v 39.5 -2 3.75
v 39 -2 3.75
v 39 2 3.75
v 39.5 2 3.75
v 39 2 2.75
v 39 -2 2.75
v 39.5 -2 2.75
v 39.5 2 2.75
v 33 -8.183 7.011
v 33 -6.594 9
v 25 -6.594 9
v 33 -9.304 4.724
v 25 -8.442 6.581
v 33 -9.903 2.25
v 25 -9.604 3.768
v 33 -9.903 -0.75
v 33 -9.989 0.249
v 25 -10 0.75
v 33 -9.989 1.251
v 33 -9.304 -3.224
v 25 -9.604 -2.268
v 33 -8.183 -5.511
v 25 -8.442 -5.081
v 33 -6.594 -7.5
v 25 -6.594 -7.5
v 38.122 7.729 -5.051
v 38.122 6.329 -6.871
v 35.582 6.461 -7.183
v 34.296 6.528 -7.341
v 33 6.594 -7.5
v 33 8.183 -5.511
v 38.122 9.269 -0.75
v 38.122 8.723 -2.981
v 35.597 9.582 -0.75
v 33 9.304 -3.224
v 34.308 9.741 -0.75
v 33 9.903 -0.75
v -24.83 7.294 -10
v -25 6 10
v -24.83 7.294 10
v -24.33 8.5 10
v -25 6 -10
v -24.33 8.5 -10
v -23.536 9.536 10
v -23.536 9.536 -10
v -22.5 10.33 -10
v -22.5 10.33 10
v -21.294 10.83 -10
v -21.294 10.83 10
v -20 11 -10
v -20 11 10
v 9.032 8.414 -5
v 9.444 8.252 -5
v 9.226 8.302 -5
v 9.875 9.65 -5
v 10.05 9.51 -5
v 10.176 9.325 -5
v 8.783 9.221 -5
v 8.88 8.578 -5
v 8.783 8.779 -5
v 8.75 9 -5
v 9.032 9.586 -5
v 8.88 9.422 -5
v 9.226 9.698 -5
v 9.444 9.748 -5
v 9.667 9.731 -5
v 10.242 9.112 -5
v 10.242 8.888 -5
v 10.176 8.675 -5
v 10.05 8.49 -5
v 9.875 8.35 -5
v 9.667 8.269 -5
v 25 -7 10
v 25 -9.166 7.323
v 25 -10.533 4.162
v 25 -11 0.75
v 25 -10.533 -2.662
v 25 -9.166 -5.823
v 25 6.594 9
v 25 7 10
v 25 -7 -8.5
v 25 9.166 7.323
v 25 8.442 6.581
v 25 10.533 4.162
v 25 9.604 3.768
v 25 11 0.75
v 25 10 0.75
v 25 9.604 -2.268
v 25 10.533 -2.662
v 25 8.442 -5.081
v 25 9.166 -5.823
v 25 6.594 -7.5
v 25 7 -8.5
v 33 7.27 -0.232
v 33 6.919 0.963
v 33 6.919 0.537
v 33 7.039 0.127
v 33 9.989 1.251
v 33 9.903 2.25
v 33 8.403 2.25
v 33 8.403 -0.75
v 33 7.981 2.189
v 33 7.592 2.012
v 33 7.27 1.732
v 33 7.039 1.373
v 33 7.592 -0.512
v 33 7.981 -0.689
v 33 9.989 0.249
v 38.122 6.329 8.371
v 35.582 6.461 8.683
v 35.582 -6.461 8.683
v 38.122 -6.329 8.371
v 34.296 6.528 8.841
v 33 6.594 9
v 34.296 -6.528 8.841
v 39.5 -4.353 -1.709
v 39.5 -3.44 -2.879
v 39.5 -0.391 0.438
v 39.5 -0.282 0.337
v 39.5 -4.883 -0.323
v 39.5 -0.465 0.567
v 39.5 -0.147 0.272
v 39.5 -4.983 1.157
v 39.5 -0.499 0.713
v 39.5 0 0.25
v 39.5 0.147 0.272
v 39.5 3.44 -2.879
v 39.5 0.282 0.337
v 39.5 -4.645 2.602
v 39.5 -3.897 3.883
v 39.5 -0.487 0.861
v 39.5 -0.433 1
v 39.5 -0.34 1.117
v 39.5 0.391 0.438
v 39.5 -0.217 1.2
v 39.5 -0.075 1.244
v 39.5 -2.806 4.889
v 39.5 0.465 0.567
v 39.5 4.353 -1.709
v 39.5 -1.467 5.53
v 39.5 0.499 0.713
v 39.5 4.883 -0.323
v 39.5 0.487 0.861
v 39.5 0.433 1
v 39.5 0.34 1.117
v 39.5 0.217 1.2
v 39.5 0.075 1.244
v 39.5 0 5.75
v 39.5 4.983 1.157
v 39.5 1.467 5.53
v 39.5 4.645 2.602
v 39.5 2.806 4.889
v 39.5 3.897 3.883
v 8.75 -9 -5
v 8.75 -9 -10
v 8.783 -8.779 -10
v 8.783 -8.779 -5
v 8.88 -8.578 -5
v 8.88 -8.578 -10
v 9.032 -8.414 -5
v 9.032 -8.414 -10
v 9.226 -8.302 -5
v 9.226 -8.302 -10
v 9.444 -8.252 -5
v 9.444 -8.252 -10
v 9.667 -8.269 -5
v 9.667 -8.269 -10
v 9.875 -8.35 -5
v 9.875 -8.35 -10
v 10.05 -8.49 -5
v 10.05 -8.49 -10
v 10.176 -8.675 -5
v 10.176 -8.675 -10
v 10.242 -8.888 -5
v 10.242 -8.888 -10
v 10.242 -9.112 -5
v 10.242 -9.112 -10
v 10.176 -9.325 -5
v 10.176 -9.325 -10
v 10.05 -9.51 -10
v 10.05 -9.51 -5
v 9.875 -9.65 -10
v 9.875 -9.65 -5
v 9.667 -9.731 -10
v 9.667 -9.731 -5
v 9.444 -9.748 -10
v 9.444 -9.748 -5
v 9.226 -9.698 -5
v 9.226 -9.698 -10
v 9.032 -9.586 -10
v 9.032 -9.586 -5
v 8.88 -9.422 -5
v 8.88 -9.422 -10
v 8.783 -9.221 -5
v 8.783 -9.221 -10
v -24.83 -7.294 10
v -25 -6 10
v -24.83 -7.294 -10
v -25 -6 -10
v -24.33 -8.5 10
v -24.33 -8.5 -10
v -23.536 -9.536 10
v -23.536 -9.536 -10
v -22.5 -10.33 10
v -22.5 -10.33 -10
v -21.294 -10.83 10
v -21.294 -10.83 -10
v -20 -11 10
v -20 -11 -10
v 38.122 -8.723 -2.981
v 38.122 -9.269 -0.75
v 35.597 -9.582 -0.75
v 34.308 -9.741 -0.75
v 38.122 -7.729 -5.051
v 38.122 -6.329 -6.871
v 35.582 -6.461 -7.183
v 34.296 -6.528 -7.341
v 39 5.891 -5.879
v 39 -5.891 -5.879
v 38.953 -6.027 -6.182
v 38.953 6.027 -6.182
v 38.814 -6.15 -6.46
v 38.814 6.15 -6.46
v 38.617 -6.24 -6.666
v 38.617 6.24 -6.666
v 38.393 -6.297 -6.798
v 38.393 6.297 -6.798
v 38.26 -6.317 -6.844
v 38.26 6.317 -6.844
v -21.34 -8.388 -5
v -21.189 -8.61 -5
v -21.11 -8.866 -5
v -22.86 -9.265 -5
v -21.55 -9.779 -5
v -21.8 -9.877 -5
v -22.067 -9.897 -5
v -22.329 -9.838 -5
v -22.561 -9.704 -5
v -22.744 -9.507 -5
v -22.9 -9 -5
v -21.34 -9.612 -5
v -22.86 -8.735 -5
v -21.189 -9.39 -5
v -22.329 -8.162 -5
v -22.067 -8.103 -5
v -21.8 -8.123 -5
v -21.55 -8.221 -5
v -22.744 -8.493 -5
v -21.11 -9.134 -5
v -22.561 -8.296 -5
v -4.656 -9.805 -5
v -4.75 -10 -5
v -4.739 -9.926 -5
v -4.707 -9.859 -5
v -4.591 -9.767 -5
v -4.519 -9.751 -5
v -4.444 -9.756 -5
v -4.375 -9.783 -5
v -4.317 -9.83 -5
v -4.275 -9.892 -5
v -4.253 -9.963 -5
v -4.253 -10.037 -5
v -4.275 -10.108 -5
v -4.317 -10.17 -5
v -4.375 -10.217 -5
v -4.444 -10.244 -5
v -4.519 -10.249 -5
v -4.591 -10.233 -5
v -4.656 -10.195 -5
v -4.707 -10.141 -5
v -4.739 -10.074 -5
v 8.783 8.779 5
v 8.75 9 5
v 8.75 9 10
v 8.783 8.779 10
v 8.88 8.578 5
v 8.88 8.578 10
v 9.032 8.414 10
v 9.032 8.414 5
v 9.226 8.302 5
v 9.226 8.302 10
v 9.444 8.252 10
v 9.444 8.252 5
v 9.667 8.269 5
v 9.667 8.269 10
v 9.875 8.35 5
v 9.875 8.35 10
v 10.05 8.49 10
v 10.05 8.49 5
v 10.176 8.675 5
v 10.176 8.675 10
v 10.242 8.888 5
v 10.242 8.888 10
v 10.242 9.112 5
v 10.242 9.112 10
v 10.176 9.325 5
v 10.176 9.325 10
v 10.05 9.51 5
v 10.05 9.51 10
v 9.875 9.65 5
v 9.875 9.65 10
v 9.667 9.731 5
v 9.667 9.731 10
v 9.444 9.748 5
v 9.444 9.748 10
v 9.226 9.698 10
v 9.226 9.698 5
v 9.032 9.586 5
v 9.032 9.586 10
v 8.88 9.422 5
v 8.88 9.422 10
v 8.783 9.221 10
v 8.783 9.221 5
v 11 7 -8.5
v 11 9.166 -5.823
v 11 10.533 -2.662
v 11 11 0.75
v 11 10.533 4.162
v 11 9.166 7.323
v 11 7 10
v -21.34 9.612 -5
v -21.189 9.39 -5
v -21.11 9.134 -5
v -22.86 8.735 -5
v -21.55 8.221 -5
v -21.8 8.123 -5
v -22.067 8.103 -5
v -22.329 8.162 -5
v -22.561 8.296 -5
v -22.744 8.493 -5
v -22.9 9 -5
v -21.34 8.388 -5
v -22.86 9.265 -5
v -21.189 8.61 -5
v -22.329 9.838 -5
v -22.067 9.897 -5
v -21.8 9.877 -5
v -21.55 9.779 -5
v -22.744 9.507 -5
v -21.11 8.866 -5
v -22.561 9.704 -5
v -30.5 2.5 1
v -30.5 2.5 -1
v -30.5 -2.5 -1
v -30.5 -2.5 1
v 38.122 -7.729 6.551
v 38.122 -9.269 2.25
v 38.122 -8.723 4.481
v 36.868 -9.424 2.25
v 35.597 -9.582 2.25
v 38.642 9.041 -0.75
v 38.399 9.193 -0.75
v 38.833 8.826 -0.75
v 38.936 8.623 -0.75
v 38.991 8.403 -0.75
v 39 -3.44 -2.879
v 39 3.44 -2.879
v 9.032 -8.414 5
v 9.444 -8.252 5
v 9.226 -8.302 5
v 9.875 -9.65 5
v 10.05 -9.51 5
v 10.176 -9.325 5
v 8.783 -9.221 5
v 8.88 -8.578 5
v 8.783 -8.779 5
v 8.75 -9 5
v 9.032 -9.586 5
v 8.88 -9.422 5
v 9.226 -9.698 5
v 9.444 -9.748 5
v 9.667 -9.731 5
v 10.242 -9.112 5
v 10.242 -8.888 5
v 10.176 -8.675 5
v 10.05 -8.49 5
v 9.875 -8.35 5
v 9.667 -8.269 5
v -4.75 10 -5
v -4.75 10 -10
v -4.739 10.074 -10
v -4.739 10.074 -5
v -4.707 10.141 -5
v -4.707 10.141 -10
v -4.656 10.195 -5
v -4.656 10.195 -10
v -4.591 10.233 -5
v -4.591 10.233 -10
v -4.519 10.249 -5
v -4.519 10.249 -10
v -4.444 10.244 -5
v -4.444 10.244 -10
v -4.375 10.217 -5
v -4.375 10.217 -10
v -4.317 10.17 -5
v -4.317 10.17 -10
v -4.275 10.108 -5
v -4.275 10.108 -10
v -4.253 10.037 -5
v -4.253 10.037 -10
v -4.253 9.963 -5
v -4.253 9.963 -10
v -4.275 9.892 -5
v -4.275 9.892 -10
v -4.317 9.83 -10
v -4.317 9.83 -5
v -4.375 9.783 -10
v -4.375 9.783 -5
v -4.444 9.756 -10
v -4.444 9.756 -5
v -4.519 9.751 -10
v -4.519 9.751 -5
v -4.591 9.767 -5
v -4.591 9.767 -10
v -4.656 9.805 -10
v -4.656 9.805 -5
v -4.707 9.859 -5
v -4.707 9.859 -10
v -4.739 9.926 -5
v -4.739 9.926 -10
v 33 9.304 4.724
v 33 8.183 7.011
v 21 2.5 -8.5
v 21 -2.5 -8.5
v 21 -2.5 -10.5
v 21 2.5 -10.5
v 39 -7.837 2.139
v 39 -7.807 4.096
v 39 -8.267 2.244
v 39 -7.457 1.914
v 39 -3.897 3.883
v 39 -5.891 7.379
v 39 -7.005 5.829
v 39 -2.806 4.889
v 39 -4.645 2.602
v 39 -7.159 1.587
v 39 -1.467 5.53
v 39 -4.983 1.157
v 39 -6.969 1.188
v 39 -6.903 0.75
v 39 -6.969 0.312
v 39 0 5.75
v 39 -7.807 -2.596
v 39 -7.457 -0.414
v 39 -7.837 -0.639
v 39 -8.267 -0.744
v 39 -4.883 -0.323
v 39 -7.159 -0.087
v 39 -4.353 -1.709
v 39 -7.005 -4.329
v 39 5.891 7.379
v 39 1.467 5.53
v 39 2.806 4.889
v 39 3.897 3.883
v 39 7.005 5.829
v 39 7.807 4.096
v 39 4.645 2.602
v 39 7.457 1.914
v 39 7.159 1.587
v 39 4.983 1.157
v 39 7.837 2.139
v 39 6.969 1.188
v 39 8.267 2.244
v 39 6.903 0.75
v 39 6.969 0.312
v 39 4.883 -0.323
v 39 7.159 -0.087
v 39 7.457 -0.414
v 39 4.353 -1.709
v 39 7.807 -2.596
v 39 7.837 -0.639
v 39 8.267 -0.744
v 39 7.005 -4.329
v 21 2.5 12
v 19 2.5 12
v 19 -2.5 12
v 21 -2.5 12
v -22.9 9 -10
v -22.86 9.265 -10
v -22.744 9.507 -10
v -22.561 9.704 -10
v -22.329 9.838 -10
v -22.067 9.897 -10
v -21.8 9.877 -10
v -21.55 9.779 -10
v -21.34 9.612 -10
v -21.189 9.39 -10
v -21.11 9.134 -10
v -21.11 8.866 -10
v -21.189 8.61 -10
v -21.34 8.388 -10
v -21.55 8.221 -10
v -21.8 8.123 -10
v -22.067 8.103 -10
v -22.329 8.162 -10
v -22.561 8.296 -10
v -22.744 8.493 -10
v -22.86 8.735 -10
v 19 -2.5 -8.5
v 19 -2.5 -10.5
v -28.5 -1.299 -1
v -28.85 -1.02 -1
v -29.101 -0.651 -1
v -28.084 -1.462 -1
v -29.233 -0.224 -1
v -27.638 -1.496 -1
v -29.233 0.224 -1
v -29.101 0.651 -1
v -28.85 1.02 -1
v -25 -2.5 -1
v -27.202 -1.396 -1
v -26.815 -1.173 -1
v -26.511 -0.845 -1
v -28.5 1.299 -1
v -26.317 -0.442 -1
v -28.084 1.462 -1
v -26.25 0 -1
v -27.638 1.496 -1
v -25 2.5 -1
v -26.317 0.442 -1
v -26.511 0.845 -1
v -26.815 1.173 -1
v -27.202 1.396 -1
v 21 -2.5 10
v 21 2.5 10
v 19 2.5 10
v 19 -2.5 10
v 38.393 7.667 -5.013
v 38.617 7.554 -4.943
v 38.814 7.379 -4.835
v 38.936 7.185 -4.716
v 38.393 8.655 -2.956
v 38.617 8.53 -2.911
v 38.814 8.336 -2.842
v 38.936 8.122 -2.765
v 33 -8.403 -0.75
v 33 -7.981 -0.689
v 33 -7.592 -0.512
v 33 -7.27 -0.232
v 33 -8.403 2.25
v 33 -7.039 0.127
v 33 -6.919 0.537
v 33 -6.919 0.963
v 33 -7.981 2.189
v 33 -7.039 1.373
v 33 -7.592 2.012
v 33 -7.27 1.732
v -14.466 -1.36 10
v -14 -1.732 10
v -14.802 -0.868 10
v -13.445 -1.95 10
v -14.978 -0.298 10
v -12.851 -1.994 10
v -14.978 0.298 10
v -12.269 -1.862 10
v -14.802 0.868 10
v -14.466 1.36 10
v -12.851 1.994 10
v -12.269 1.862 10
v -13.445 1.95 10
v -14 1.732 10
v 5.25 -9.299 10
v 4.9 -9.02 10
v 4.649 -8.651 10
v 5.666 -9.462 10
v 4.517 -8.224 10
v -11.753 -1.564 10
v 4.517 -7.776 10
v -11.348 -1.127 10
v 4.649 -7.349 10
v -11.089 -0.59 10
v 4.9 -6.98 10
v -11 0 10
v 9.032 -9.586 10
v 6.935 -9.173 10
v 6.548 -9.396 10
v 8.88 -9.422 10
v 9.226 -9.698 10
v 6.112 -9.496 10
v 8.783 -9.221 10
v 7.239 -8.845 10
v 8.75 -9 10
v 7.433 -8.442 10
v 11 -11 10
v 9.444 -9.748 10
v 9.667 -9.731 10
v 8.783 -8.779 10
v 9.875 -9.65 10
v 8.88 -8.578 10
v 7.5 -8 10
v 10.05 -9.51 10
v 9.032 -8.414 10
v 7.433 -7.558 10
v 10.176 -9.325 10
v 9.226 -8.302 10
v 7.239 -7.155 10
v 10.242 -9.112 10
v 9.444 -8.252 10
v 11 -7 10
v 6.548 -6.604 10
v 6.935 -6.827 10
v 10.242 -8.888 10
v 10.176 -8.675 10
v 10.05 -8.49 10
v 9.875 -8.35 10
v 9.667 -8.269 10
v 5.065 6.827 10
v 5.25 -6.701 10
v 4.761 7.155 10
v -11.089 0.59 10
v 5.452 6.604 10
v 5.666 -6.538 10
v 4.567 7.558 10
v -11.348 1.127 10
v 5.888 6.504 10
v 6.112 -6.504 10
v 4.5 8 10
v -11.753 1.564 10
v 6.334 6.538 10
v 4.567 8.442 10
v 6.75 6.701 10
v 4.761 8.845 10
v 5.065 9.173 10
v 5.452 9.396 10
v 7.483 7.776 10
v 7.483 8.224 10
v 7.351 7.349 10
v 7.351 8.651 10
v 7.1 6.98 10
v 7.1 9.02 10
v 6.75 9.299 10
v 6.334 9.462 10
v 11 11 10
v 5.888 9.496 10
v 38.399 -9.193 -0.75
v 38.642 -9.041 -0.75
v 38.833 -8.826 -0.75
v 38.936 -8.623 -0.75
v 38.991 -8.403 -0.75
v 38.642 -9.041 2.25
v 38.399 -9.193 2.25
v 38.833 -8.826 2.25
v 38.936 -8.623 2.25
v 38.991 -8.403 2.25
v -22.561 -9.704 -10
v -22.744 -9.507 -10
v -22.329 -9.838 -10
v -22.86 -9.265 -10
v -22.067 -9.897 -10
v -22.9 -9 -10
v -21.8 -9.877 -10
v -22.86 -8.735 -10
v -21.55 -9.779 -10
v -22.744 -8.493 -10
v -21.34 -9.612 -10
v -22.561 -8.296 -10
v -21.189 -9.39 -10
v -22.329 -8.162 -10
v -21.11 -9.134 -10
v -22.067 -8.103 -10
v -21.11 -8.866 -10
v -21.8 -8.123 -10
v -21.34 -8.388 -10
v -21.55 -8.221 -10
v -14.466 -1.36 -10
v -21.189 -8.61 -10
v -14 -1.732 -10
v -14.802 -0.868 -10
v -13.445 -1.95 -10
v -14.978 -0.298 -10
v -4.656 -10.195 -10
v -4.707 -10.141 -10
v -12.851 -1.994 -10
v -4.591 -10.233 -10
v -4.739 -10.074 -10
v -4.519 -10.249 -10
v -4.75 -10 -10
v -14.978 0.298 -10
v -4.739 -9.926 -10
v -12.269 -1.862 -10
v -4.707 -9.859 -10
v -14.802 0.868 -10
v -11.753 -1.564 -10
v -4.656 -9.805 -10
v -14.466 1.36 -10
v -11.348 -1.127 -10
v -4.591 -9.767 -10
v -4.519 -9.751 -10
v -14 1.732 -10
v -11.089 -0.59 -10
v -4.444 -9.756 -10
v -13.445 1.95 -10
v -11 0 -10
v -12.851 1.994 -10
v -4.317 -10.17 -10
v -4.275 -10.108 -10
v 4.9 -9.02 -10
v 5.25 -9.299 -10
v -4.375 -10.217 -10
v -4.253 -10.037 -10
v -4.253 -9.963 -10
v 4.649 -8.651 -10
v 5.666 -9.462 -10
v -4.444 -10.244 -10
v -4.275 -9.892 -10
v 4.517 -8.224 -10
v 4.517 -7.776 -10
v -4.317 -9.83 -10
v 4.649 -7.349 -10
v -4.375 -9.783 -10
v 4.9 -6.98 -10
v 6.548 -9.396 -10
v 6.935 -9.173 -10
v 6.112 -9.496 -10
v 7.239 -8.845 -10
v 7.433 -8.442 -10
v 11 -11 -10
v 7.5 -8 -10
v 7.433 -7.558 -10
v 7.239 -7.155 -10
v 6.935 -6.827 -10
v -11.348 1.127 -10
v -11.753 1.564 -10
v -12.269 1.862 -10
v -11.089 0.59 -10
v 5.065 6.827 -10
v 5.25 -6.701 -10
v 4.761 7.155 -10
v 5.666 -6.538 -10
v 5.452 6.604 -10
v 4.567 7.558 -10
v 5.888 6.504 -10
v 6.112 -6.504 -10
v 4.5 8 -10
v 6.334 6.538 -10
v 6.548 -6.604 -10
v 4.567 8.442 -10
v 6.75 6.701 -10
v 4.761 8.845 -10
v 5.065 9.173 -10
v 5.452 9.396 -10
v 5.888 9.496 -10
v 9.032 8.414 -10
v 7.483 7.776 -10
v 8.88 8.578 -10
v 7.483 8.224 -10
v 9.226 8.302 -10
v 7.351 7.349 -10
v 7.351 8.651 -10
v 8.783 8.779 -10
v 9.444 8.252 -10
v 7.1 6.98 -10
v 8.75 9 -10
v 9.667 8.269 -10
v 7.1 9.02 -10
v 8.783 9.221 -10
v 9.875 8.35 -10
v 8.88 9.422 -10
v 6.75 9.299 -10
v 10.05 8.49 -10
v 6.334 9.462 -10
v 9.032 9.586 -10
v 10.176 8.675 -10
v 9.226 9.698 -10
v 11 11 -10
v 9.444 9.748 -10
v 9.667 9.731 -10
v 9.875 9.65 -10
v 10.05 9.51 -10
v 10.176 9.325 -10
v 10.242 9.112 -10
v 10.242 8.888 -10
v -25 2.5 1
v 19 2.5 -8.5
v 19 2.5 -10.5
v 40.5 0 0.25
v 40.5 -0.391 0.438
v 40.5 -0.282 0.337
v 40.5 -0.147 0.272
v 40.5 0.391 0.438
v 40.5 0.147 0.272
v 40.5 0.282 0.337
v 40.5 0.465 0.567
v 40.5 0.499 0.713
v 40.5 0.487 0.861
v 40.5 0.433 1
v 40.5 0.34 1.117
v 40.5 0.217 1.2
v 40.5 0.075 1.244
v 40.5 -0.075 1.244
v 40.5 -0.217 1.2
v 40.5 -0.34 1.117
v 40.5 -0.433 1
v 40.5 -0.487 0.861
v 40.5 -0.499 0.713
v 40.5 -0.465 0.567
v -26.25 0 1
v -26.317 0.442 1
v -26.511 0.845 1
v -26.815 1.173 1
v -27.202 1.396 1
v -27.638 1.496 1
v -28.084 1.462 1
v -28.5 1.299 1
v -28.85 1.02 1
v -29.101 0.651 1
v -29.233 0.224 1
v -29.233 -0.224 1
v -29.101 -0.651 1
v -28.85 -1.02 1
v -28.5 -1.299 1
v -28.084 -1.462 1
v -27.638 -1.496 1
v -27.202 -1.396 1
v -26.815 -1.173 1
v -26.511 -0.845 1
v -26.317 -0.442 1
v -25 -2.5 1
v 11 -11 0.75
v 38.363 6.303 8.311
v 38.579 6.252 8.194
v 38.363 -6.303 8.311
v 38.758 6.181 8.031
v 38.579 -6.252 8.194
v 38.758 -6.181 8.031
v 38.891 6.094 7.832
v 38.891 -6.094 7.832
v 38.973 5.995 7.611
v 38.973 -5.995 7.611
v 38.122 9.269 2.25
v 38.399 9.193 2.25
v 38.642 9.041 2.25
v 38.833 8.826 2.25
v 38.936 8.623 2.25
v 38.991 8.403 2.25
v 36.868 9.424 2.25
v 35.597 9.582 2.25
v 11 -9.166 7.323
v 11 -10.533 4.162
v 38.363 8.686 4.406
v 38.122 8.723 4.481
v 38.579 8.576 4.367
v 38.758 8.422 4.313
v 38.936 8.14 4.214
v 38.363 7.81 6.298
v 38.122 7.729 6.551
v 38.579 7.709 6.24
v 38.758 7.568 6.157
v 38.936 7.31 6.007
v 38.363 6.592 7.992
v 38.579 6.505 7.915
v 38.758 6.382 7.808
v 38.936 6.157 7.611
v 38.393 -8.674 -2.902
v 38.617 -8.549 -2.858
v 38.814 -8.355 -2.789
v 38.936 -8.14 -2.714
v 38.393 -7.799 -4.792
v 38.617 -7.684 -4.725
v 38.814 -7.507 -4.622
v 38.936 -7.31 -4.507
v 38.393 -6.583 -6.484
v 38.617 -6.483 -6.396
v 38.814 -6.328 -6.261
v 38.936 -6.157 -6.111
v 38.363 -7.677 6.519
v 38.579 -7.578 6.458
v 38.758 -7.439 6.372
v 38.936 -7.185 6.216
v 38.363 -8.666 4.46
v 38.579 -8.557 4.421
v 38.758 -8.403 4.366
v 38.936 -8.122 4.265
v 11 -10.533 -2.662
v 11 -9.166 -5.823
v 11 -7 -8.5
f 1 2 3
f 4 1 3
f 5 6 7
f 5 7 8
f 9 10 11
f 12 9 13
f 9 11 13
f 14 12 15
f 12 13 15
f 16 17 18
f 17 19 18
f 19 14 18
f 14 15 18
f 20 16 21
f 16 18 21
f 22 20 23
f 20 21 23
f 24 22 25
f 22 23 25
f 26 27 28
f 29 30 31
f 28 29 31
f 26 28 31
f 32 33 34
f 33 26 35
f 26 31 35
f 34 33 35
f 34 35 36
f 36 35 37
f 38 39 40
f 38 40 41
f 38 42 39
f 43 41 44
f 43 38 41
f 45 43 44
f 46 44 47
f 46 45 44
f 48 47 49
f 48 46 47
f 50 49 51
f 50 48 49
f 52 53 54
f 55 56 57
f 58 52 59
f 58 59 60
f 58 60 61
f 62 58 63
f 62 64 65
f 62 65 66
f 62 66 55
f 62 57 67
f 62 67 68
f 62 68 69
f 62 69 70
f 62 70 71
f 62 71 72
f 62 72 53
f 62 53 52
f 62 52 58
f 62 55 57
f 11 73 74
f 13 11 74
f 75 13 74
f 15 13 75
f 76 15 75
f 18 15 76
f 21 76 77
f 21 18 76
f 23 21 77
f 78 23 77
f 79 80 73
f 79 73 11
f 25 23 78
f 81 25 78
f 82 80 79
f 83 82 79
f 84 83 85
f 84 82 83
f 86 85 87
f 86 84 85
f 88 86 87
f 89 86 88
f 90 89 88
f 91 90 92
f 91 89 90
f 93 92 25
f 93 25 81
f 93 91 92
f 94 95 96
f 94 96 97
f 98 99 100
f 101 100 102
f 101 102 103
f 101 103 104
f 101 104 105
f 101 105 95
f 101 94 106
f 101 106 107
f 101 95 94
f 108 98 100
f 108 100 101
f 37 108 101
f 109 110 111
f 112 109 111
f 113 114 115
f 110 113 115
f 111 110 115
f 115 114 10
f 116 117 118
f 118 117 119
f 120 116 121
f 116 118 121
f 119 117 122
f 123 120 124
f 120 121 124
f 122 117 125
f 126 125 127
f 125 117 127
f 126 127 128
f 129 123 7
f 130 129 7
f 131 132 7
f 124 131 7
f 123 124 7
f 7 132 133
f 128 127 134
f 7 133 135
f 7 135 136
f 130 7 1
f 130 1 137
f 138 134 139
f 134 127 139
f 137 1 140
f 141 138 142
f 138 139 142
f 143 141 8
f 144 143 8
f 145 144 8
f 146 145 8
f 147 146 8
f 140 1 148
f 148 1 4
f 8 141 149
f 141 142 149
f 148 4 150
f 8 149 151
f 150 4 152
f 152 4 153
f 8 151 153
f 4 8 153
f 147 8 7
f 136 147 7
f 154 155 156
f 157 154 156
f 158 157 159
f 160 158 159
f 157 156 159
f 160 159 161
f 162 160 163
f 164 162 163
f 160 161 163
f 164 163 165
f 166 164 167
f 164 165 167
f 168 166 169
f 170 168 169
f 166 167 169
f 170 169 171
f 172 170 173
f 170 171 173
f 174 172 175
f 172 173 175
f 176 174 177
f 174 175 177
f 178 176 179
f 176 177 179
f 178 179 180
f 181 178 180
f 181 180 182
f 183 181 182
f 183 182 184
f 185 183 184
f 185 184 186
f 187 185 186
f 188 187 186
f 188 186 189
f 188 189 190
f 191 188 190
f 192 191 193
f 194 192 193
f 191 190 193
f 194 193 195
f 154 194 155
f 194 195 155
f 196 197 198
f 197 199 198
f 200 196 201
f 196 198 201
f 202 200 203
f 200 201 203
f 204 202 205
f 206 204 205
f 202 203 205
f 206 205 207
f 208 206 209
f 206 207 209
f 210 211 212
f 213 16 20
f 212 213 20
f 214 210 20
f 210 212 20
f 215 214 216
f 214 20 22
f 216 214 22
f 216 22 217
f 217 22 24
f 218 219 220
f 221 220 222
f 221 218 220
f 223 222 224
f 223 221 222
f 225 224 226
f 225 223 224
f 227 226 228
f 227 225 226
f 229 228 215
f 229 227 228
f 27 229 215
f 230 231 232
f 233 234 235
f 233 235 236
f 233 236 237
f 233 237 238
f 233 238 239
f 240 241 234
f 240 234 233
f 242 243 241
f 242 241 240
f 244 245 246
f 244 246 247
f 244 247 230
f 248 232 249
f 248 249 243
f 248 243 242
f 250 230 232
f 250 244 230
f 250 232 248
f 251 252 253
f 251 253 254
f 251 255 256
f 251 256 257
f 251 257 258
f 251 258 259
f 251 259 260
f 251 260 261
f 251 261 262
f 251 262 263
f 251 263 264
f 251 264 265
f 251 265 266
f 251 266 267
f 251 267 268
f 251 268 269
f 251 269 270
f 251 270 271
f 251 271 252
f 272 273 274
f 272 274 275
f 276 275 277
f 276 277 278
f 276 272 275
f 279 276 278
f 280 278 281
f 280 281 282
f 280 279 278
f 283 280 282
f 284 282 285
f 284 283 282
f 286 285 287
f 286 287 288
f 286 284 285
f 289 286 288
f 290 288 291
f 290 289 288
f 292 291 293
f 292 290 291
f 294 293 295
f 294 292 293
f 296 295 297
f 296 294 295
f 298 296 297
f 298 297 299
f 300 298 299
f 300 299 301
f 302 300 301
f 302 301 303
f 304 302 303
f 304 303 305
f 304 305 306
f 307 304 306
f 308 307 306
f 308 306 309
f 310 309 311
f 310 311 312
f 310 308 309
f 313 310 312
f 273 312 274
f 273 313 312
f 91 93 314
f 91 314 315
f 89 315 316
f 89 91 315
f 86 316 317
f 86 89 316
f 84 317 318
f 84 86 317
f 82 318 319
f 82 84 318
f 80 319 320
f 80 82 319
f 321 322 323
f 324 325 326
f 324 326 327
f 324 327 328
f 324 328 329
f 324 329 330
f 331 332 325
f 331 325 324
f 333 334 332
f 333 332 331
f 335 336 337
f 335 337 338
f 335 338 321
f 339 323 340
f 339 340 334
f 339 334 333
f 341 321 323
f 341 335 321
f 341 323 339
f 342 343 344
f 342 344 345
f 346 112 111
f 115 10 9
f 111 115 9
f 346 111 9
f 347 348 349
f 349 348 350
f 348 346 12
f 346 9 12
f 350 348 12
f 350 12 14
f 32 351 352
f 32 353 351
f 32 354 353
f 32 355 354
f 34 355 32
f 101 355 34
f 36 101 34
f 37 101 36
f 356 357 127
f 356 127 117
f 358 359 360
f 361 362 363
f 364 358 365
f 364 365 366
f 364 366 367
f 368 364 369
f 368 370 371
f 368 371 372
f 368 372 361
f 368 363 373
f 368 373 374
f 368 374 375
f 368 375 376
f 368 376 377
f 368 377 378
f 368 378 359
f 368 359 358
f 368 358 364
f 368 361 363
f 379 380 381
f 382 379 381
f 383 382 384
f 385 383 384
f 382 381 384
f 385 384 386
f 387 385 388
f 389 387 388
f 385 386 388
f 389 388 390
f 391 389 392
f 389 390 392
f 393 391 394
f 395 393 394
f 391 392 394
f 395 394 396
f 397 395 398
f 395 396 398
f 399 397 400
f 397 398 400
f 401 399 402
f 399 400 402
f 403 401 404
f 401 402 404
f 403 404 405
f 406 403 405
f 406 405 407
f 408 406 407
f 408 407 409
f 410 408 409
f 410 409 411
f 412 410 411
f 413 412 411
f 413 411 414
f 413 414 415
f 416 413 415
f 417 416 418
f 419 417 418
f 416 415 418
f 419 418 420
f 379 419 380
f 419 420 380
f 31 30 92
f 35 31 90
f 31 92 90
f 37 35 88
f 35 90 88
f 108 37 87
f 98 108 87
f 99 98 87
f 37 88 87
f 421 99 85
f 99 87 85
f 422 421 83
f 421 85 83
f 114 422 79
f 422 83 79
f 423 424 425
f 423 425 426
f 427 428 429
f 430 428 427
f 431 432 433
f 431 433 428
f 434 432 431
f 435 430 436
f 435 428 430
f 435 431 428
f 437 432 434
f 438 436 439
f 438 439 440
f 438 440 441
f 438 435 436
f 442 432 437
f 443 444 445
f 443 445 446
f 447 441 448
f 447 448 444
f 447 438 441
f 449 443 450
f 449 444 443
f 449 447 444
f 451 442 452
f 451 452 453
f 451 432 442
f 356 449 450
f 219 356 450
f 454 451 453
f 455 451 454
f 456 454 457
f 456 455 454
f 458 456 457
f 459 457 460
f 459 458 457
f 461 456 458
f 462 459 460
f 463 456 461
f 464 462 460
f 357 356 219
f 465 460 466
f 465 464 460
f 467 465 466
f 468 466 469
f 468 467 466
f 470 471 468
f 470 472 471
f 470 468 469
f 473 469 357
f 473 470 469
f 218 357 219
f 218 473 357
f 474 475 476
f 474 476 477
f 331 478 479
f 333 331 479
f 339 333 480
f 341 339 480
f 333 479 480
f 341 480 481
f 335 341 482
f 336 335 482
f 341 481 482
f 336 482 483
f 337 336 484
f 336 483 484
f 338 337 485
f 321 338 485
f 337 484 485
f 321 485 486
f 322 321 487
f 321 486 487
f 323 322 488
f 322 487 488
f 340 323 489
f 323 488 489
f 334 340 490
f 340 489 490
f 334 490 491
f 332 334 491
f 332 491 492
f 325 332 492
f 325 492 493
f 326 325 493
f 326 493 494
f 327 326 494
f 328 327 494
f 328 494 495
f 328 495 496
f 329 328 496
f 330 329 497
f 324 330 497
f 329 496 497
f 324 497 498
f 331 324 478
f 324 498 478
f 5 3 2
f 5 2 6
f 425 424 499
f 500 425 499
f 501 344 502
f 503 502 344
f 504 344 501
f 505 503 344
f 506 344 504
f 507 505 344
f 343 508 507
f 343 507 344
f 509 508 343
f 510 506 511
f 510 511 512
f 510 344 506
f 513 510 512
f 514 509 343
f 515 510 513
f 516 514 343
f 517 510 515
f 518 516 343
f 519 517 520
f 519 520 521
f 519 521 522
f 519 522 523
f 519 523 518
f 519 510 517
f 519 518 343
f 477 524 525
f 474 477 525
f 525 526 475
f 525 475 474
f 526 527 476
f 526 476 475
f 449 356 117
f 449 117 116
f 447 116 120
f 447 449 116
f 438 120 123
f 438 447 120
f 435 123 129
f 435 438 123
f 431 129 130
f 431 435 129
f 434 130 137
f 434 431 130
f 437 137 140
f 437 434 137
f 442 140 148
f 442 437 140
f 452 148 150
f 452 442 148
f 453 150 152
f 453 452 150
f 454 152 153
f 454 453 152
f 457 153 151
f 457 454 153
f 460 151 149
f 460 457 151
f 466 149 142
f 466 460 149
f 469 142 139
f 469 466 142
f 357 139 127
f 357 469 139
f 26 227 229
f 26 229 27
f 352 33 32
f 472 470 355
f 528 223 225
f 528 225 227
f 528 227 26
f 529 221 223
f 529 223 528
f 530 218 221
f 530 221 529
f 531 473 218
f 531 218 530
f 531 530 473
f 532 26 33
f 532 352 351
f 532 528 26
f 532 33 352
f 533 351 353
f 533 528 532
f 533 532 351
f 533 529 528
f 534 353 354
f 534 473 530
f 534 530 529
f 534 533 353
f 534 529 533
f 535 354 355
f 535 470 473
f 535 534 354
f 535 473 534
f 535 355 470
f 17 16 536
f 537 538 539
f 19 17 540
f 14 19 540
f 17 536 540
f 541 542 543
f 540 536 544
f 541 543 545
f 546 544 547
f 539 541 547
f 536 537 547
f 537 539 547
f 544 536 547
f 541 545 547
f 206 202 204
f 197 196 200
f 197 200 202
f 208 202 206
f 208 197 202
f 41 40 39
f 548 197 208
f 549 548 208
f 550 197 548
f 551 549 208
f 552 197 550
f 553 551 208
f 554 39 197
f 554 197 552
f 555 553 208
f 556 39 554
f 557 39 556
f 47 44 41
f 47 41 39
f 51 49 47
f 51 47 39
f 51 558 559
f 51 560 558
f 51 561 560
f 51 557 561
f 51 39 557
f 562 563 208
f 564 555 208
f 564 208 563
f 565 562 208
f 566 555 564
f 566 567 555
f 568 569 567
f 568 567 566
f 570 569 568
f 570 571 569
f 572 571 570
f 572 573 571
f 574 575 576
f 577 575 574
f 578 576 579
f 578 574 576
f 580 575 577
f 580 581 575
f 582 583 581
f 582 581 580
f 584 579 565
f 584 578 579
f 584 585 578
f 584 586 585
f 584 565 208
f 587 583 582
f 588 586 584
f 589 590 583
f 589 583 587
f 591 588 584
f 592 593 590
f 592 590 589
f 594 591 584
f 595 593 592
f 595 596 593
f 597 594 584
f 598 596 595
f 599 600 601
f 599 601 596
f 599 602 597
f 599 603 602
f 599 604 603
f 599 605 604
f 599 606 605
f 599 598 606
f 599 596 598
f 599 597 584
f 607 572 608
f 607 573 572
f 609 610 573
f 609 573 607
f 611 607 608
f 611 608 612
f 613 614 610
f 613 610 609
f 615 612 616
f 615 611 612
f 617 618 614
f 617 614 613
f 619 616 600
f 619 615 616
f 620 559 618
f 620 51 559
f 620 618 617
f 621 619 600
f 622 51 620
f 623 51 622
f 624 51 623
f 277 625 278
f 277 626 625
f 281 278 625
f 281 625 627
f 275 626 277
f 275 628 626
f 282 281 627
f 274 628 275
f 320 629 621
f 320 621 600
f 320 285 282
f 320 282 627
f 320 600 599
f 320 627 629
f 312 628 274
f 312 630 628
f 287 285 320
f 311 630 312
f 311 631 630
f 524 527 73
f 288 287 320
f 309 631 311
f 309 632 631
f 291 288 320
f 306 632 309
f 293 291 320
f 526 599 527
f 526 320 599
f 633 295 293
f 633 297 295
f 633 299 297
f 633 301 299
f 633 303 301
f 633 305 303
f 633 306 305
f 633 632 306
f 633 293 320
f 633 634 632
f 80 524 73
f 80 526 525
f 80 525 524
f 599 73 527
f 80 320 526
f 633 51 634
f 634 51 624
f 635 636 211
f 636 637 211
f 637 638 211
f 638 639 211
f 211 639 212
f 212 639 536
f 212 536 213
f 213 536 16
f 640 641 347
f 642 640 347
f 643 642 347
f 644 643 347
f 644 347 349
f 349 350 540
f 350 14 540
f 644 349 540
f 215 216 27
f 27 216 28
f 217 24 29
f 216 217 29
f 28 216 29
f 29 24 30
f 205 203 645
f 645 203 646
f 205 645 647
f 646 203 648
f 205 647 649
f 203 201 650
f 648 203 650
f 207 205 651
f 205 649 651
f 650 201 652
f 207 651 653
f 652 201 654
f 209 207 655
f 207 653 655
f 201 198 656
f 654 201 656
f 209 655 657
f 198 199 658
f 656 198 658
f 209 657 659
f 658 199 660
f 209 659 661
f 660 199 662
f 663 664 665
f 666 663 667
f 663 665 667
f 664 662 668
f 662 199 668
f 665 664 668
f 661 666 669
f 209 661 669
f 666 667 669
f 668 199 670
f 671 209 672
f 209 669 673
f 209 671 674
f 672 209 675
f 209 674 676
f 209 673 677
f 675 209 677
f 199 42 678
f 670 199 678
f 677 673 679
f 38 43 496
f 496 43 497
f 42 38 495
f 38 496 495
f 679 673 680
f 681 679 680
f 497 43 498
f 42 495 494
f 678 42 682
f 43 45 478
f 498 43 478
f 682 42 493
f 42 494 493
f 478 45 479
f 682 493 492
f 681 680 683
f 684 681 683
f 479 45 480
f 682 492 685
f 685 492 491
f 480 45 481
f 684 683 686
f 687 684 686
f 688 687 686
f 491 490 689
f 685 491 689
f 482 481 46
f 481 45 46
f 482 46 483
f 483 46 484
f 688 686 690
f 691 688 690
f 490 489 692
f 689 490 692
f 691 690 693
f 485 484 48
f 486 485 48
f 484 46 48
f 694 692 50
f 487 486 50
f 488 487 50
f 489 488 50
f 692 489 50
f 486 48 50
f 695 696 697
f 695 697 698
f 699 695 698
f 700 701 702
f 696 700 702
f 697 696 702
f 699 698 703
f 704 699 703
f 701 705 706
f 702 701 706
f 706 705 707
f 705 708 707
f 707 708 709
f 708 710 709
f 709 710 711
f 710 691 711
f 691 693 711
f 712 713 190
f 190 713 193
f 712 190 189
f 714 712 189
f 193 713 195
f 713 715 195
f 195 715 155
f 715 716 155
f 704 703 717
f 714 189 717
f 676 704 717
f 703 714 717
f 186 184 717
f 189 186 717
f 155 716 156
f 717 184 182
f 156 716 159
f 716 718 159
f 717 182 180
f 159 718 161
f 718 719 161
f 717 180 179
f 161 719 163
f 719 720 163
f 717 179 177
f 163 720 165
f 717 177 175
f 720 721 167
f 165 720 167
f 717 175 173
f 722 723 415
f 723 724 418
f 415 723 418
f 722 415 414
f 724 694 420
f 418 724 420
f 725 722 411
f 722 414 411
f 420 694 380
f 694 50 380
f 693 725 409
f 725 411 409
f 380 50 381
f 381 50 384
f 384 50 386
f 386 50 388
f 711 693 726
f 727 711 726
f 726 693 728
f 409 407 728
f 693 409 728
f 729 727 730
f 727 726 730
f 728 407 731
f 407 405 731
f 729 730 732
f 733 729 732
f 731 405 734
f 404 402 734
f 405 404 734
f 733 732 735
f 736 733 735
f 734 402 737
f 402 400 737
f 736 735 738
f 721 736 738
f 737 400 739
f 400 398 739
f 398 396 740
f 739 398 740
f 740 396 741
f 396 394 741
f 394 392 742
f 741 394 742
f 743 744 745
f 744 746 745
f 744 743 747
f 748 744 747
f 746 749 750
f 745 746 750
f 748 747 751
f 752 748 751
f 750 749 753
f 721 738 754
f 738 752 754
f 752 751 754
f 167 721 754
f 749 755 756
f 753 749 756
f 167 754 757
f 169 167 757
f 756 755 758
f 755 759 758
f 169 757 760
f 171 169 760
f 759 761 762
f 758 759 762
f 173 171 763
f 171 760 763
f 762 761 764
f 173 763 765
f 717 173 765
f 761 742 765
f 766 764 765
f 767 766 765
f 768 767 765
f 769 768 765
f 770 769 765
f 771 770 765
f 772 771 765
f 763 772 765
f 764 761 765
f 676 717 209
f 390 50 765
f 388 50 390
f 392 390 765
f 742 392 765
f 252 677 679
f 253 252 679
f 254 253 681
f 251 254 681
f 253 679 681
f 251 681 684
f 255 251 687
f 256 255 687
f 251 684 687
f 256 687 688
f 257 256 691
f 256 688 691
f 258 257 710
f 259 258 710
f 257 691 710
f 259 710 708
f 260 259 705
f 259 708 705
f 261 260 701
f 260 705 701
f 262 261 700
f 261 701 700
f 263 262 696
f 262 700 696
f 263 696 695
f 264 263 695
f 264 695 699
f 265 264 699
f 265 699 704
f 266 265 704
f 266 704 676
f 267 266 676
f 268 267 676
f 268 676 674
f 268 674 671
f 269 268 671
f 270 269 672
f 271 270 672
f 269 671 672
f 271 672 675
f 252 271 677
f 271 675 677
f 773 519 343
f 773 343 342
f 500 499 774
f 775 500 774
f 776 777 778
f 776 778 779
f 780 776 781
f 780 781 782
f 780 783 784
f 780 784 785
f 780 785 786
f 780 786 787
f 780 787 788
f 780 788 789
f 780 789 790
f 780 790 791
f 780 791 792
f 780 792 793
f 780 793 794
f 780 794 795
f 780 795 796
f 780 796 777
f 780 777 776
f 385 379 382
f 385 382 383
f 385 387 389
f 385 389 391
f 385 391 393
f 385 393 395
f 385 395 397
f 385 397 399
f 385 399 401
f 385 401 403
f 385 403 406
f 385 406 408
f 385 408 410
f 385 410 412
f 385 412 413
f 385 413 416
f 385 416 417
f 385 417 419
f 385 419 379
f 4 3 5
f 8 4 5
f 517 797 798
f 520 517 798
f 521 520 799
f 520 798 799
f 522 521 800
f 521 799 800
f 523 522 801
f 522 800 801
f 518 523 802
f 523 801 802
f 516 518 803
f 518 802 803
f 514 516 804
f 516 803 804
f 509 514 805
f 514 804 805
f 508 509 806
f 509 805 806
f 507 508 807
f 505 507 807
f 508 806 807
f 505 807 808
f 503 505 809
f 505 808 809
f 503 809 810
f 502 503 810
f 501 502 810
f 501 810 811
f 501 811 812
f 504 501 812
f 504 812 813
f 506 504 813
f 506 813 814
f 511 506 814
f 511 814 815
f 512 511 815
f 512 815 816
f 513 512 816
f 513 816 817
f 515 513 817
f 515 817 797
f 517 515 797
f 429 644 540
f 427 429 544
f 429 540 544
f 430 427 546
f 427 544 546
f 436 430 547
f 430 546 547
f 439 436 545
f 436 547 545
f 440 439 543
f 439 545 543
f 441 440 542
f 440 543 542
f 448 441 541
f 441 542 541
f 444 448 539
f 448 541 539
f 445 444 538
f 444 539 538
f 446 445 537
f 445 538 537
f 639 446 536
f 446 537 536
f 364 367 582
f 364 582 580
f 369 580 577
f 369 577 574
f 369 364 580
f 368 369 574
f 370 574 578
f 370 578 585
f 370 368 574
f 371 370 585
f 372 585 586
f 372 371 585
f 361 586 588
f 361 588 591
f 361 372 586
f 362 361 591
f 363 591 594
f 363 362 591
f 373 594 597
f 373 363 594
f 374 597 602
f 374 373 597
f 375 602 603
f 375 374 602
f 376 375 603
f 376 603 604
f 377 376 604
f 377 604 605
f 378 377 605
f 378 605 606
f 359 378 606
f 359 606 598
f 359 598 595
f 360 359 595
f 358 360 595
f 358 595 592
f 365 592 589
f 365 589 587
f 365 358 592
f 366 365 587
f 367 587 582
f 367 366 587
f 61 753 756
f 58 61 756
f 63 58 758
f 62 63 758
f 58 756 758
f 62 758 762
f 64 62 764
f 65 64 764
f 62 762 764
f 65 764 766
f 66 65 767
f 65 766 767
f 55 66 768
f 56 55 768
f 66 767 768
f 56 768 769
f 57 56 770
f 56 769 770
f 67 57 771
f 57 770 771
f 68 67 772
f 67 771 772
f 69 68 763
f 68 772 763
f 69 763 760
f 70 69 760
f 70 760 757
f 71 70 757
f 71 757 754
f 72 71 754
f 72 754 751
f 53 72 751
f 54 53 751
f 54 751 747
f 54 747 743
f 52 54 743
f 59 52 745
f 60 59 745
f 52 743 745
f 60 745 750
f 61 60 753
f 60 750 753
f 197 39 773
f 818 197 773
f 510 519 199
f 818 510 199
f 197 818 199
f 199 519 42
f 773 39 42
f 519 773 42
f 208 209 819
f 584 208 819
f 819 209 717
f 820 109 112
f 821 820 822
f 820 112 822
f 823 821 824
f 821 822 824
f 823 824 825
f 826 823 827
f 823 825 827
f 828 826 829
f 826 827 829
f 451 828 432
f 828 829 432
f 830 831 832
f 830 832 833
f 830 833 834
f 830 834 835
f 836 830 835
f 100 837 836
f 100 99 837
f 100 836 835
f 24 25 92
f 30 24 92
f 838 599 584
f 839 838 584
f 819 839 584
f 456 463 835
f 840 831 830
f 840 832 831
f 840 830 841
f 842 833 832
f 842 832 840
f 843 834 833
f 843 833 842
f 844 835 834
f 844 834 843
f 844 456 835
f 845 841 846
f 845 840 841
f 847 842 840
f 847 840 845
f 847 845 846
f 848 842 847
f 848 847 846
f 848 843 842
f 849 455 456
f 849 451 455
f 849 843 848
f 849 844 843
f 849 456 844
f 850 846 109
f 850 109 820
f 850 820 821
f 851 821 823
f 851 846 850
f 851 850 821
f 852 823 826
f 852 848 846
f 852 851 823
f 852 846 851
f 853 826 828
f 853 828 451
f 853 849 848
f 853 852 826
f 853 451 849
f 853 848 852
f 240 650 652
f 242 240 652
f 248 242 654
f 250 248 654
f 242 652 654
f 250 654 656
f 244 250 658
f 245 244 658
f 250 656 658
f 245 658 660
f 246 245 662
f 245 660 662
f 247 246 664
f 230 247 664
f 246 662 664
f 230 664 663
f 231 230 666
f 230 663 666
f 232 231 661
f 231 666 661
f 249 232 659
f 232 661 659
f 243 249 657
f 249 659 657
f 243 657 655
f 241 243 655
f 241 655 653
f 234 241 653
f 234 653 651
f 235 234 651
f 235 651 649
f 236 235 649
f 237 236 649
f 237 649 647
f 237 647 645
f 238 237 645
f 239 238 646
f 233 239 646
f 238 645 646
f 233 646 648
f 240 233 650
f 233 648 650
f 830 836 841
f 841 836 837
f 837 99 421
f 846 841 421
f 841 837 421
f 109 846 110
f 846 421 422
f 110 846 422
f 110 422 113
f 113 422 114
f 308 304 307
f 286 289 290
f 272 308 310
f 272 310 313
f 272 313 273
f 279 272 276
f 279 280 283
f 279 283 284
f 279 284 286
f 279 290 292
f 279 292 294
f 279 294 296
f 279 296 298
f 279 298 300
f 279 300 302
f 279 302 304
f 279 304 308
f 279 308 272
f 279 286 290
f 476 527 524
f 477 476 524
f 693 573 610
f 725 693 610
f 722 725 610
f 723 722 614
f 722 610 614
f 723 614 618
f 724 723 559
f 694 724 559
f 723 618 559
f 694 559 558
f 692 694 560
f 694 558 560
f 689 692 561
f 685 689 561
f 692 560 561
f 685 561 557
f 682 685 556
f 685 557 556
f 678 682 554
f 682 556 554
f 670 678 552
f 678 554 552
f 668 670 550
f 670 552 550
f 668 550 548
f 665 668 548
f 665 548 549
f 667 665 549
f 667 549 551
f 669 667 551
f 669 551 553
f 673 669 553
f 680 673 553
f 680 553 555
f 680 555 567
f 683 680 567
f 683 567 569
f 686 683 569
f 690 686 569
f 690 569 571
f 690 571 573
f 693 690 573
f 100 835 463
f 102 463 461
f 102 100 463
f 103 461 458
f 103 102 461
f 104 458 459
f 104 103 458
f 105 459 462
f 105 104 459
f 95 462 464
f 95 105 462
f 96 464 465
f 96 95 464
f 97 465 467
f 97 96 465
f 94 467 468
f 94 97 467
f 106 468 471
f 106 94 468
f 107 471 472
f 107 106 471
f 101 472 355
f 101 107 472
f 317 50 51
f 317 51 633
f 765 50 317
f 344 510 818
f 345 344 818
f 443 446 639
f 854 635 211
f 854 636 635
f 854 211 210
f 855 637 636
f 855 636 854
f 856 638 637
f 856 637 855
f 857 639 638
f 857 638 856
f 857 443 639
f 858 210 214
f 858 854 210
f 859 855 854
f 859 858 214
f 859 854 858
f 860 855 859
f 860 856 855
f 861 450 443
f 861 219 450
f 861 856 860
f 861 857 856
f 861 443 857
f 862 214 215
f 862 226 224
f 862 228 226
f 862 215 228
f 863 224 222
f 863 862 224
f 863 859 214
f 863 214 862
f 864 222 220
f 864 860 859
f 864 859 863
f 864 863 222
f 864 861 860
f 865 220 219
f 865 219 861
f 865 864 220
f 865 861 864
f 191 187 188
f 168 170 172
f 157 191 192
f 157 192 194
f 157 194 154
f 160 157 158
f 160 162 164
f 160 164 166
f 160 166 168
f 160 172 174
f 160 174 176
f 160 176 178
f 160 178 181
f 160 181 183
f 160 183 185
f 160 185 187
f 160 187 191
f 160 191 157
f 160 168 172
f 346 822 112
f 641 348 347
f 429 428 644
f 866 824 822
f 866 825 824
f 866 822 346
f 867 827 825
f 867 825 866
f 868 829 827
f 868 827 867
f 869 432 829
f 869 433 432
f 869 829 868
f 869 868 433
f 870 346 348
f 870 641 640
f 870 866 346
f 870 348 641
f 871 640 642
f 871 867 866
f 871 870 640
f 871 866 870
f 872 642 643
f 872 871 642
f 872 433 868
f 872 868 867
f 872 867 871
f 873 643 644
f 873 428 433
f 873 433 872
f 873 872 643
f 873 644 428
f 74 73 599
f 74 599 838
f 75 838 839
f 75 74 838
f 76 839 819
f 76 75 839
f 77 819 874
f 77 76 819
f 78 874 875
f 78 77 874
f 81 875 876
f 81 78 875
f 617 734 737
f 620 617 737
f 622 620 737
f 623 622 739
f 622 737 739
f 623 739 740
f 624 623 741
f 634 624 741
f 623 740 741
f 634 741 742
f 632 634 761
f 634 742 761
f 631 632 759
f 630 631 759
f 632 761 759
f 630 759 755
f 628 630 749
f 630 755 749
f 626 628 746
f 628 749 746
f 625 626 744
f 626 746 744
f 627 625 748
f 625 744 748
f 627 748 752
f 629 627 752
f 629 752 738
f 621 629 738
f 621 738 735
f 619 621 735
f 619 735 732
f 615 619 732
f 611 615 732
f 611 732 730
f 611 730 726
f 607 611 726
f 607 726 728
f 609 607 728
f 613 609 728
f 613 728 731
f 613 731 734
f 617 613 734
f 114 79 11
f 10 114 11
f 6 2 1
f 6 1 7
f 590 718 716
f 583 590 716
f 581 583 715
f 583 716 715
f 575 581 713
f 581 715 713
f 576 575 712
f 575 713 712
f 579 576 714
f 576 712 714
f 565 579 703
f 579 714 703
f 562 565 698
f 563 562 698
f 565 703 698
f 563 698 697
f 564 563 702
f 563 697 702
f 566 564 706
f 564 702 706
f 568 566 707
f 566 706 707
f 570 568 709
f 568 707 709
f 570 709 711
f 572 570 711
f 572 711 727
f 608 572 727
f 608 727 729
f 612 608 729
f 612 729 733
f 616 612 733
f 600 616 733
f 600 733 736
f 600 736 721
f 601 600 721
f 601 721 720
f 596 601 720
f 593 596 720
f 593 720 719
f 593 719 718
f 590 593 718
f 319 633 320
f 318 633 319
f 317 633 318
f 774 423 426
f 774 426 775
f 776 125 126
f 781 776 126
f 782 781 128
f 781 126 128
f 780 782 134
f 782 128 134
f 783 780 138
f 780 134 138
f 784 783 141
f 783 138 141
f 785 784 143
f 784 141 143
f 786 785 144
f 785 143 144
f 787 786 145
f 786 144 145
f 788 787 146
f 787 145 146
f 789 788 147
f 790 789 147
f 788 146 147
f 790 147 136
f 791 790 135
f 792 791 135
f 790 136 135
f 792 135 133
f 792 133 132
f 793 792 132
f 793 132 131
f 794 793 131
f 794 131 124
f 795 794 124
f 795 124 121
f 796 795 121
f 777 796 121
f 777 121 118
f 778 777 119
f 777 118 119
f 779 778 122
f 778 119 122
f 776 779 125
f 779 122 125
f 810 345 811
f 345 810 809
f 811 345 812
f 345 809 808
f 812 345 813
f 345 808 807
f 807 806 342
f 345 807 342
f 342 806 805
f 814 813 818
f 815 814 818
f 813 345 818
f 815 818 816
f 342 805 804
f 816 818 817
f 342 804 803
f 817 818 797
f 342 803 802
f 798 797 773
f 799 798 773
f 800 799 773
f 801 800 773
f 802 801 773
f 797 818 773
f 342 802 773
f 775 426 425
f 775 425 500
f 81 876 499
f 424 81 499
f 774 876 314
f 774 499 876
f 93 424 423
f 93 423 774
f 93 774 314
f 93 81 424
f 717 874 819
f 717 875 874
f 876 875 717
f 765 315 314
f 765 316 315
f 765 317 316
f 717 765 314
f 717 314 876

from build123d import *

# Parameters (mm, degrees)
CROQUIS1_W               = 50
CROQUIS1_H               = 20
SALIENTE_EXTRUIR1_DEPTH  = 11
REDONDEO1_R              = 5
CROQUIS2_OUTSIDE_W       = 33.634
CROQUIS2_OUTSIDE_H       = 35.634
CORTAR_EXTRUIR1_DEPTH    = 14
CROQUIS3_R               = 1.5
CORTAR_EXTRUIR2_DEPTH    = 34.85262176
CROQUIS4_W               = 2
CROQUIS4_H               = 5
SALIENTE_EXTRUIR2_DEPTH  = 2
CROQUIS5_W               = 2
CROQUIS5_H               = 5
SALIENTE_EXTRUIR5_DEPTH  = 2
CROQUIS6_R               = 0.75
CROQUIS6_R_2             = 0.25
CROQUIS6_R_3             = 0.9
CORTAR_EXTRUIR3_DEPTH    = 5
CORTAR_EXTRUIR4_START    = -5
CROQUIS7_R               = 0.75
CORTAR_EXTRUIR4_DEPTH    = 5
SALIENTE_EXTRUIR6_DEPTH  = 8
CROQUIS9_R               = 2
CORTAR_EXTRUIR5_DEPTH    = 41.376354466
SALIENTE_EXTRUIR7_DEPTH  = 6
SALIENTE_EXTRUIR7_DRAFT  = 7
REDONDEO2_R              = 1
CROQUIS12_W              = 1
CROQUIS12_H              = 4
SALIENTE_EXTRUIR8_DEPTH  = 0.5
CROQUIS13_R              = 0.5
SALIENTE_EXTRUIR9_DEPTH  = 1
CORTAR_EXTRUIR6_START    = -6
CORTAR_EXTRUIR6_DEPTH    = 6
CROQUIS15_W              = 2
CROQUIS15_H              = 5
SALIENTE_EXTRUIR10_DEPTH = 5.5
CROQUIS16_R              = 1.5
CORTAR_EXTRUIR7_DEPTH    = 44.514365444


with BuildPart() as part:
    # Croquis1 → Saliente-Extruir1 (new, symmetric)
    with BuildSketch(Plane(origin=(0, 0, 0), x_dir=(1, 0, 0), z_dir=(0, 1, 0))):
        Rectangle(CROQUIS1_W, CROQUIS1_H)
    extrude(amount=SALIENTE_EXTRUIR1_DEPTH, both=True)

    # Redondeo1
    redondeo1_edges = [part.edges().sort_by_distance(p)[0] for p in [
        (-25, 11, 0),
        (-25, -11, 0),
    ]]
    fillet(redondeo1_edges, radius=REDONDEO1_R)

    # Croquis2 outside → Cortar-Extruir1 (cut)
    with BuildSketch(Plane(origin=(25, 0, 0), x_dir=(0, 0, -1), z_dir=(1, 0, 0))):
        Rectangle(CROQUIS2_OUTSIDE_W, CROQUIS2_OUTSIDE_H)
        with BuildLine():
            Line((-10, 7), (-10, -7))
            ThreePointArc((-10, -7), (-0.75, -11), (8.5, -7))
            Line((8.5, -7), (8.5, 7))
            ThreePointArc((8.5, 7), (-0.75, 11), (-10, 7))
        make_face(mode=Mode.SUBTRACT)
    extrude(amount=-CORTAR_EXTRUIR1_DEPTH, mode=Mode.SUBTRACT)

    # Croquis3 → Cortar-Extruir2 (cut, through all)
    with BuildSketch(Plane(origin=(0, 0, -10), x_dir=(-1, 0, 0), z_dir=(0, 0, -1))):
        with Locations((-6, 8)):
            Circle(CROQUIS3_R)
        with Locations(Location((-6, -8, 0), (0, 0, 180))):
            Circle(CROQUIS3_R)
    extrude(amount=-CORTAR_EXTRUIR2_DEPTH, mode=Mode.SUBTRACT)

    # Croquis4 → Saliente-Extruir2 (add)
    with BuildSketch(Plane.XY.offset(10)):
        with Locations((20, 0)):
            Rectangle(CROQUIS4_W, CROQUIS4_H)
    extrude(amount=SALIENTE_EXTRUIR2_DEPTH)

    # Croquis5 → Saliente-Extruir5 (add)
    with BuildSketch(Plane(origin=(0, 0, -8.5), x_dir=(-1, 0, 0), z_dir=(0, 0, -1))):
        with Locations((-20, 0)):
            Rectangle(CROQUIS5_W, CROQUIS5_H)
    extrude(amount=SALIENTE_EXTRUIR5_DEPTH)

    # Croquis6 → Cortar-Extruir3 (cut)
    with BuildSketch(Plane(origin=(0, 0, -10), x_dir=(-1, 0, 0), z_dir=(0, 0, -1))):
        with Locations((-9.5, 9)):
            Circle(CROQUIS6_R)
        with Locations((-9.5, -9)):
            Circle(CROQUIS6_R)
        with Locations((4.5, -10)):
            Circle(CROQUIS6_R_2)
        with Locations((4.5, 10)):
            Circle(CROQUIS6_R_2)
        with Locations((22, 9)):
            Circle(CROQUIS6_R_3)
        with Locations((22, -9)):
            Circle(CROQUIS6_R_3)
    extrude(amount=-CORTAR_EXTRUIR3_DEPTH, mode=Mode.SUBTRACT)

    # Croquis7 → Cortar-Extruir4 (cut)
    with BuildSketch(Plane.XY.offset(10).offset(CORTAR_EXTRUIR4_START)):
        with Locations(Location((9.5, -9, 0), (0, 0, 180))):
            Circle(CROQUIS7_R)
        with Locations(Location((9.5, 9, 0), (0, 0, 180))):
            Circle(CROQUIS7_R)
    extrude(amount=CORTAR_EXTRUIR4_DEPTH, mode=Mode.SUBTRACT)

    # Croquis8 → Saliente-Extruir6 (add)
    with BuildSketch(Plane(origin=(25, 0, 0), x_dir=(0, 0, -1), z_dir=(1, 0, 0))):
        with BuildLine():
            Line((-9, 6.594309595), (-9, -6.594309595))
            ThreePointArc((-9, -6.594309595), (-0.75, -10), (7.5, -6.594309595))
            Line((7.5, -6.594309595), (7.5, 6.594309595))
            ThreePointArc((7.5, 6.594309595), (-0.75, 10), (-9, 6.594309595))
        make_face()
    extrude(amount=SALIENTE_EXTRUIR6_DEPTH)

    # Croquis9 → Cortar-Extruir5 (cut, through all)
    with BuildSketch(Plane.XY.offset(10)):
        with Locations((-13, 0)):
            Circle(CROQUIS9_R)
    extrude(amount=-CORTAR_EXTRUIR5_DEPTH, mode=Mode.SUBTRACT)


with BuildPart() as saliente_extruir7_tool:
    # Croquis11 → Saliente-Extruir7 (with draft: the straight prism first)
    with BuildSketch(Plane(origin=(33, 0, 0), x_dir=(0, 0, -1), z_dir=(1, 0, 0))):
        with BuildLine():
            Line((-9, 6.594309595), (-9, -6.594309595))
            ThreePointArc((-9, -6.594309595), (-0.75, -10), (7.5, -6.594309595))
            Line((7.5, -6.594309595), (7.5, 6.594309595))
            ThreePointArc((7.5, 6.594309595), (-0.75, 10), (-9, 6.594309595))
        make_face()
    extrude(amount=SALIENTE_EXTRUIR7_DEPTH)
    # Saliente-Extruir7: the draft: its side faces are tilted about the plane it starts from
    saliente_extruir7_sides = [saliente_extruir7_tool.faces().sort_by_distance(p)[0] for p in [
        (36, 0, 9),
        (36, -10, 0.75),
        (36, 0, -7.5),
        (36, 10, 0.75),
    ]]
    draft(saliente_extruir7_sides, Plane(origin=(33, 0, 0), x_dir=(0, 0, -1), z_dir=(1, 0, 0)), SALIENTE_EXTRUIR7_DRAFT)


with BuildPart() as part_1:
    add(part.part)

    # Saliente-Extruir7: add saliente_extruir7_tool
    add(saliente_extruir7_tool.part)

    # Redondeo2
    redondeo2_edges = [part_1.edges().sort_by_distance(p)[0] for p in [
        (39, 0, -6.763292635),
        (39, -9.263292635, 0.75),
        (39, 0, 8.263292635),
        (39, 9.263292635, 0.75),
    ]]
    fillet(redondeo2_edges, radius=REDONDEO2_R - 0.0001)  # a hair under: the kernel refuses the full size

    # Croquis12 → Saliente-Extruir8 (add)
    with BuildSketch(Plane(origin=(39, 0, 0), x_dir=(0, 0, -1), z_dir=(1, 0, 0))):
        with BuildLine():
            Line((2.87856737, 3.439985297), (2.87856737, -3.439985297))
            ThreePointArc((2.87856737, -3.439985297), (-5.75, 0), (2.87856737, 3.439985297))
        make_face()
        with Locations((-3.25, 0)):
            Rectangle(CROQUIS12_W, CROQUIS12_H, mode=Mode.SUBTRACT)
    extrude(amount=SALIENTE_EXTRUIR8_DEPTH)

    # Croquis13 → Saliente-Extruir9 (add)
    with BuildSketch(Plane(origin=(39.5, 0, 0), x_dir=(0, 0, -1), z_dir=(1, 0, 0))):
        with Locations((-0.75, 0)):
            Circle(CROQUIS13_R)
    extrude(amount=SALIENTE_EXTRUIR9_DEPTH)

    # Croquis14 → Cortar-Extruir6 (cut)
    with BuildSketch(Plane(origin=(39, 0, 0), x_dir=(0, 0, -1), z_dir=(1, 0, 0)).offset(CORTAR_EXTRUIR6_START)):
        with BuildLine():
            Line((-2.25, 9.903408743), (-2.25, 8.403408743))
            ThreePointArc((-2.25, 8.403408743), (-0.75, 6.903408743), (0.75, 8.403408743))
            Line((0.75, 8.403408743), (0.75, 9.903408743))
            ThreePointArc((0.75, 9.903408743), (-0.75, 10), (-2.25, 9.903408743))
        make_face()
        with BuildLine():
            Line((-2.25, -9.903408743), (-2.25, -8.403408743))
            ThreePointArc((-2.25, -8.403408743), (-0.75, -6.903408743), (0.75, -8.403408743))
            Line((0.75, -8.403408743), (0.75, -9.903408743))
            ThreePointArc((0.75, -9.903408743), (-0.75, -10), (-2.25, -9.903408743))
        make_face()
    extrude(amount=CORTAR_EXTRUIR6_DEPTH, mode=Mode.SUBTRACT)

    # Croquis15 → Saliente-Extruir10 (add)
    with BuildSketch(Plane.ZY.offset(25)):
        Rectangle(CROQUIS15_W, CROQUIS15_H)
    extrude(amount=SALIENTE_EXTRUIR10_DEPTH)

    # Croquis16 → Cortar-Extruir7 (cut, through all)
    with BuildSketch(Plane.XY.offset(1)):
        with Locations((-27.75, 0)):
            Circle(CROQUIS16_R)
    extrude(amount=-CORTAR_EXTRUIR7_DEPTH, mode=Mode.SUBTRACT)


solid = part_1.part
